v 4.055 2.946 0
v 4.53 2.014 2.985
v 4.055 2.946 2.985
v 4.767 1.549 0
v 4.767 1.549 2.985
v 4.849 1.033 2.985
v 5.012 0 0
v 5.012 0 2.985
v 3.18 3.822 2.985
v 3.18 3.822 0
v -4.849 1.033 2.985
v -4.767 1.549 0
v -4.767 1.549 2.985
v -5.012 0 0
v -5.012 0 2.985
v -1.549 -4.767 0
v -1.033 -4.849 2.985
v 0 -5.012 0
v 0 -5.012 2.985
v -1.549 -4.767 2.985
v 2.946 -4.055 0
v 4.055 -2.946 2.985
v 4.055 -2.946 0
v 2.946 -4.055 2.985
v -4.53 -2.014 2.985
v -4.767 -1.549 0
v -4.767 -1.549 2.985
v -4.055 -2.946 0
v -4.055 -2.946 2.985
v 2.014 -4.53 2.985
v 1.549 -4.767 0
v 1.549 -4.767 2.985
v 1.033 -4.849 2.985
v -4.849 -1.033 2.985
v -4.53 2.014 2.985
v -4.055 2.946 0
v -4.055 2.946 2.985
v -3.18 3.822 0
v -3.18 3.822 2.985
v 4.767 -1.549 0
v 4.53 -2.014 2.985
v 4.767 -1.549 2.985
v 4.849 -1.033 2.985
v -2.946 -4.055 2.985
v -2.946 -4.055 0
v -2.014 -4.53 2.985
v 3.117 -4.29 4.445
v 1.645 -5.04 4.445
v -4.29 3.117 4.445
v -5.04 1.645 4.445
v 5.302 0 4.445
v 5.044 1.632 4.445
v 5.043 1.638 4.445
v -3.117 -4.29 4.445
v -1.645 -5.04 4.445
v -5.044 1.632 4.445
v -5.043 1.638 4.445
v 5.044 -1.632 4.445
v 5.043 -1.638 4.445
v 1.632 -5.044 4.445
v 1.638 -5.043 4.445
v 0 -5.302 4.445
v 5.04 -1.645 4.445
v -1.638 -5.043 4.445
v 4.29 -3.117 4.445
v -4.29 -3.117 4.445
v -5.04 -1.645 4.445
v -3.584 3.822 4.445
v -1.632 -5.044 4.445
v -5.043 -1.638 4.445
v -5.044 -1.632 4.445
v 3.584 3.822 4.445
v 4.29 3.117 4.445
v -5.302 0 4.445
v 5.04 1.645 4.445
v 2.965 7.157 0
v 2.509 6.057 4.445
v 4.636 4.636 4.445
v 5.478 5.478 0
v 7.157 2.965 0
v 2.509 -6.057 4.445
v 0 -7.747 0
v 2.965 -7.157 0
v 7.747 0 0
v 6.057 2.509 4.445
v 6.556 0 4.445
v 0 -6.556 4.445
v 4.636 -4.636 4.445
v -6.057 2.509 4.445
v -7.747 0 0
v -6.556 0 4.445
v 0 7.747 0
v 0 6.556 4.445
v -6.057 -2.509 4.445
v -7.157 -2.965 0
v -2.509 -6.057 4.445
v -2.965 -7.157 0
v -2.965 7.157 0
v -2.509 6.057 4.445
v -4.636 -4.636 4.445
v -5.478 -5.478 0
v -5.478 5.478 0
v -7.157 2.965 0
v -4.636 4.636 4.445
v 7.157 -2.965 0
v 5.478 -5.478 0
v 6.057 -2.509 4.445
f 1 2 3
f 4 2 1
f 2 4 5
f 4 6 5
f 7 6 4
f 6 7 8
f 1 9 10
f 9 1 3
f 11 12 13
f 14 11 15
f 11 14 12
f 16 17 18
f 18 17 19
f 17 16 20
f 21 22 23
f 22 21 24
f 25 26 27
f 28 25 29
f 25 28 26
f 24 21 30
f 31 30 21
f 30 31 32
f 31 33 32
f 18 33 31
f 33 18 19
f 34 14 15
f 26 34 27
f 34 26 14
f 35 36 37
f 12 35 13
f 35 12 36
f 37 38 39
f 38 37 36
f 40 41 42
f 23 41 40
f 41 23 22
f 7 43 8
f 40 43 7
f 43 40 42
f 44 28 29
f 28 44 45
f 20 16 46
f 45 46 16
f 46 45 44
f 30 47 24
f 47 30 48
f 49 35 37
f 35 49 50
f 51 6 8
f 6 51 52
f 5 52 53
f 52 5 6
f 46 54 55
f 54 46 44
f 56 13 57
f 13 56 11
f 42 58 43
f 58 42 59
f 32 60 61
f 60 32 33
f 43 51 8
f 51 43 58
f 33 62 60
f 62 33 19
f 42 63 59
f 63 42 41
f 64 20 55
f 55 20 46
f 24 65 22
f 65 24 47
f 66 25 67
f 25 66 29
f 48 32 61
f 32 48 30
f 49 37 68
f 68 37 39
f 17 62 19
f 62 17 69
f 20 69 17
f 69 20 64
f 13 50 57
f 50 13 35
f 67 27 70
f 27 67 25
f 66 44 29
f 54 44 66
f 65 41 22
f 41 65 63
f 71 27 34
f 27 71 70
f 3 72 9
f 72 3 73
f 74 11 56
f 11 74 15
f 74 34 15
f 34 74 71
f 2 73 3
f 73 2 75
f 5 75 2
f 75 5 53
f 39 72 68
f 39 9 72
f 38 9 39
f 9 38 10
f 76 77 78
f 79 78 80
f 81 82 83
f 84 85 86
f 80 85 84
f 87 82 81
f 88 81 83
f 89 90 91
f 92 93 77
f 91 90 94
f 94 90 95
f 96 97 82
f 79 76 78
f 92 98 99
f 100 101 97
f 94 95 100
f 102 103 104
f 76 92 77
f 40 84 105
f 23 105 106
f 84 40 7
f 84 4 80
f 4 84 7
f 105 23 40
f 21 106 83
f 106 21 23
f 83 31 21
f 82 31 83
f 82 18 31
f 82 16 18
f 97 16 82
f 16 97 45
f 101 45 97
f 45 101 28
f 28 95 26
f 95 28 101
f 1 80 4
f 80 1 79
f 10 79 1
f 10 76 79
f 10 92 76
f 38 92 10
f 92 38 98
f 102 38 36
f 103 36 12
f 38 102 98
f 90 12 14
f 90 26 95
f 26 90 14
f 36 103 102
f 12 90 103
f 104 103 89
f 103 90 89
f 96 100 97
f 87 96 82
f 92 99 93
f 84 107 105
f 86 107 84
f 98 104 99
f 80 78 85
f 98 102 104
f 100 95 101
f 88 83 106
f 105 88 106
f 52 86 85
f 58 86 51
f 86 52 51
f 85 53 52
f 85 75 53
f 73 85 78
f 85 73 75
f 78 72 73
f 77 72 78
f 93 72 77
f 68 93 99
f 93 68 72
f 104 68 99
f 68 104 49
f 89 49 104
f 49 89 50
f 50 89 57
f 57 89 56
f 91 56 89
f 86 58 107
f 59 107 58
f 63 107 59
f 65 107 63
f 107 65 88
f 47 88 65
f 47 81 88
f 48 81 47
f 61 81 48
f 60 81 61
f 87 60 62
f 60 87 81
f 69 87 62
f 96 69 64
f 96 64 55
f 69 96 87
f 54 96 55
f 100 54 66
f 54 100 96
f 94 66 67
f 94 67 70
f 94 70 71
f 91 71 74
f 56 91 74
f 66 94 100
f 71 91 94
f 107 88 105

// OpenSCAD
// file: my_core.scad
inch = 25.4; // conversion factor

$fn=16;

threadwidth = 0.4;
tgap = 2*threadwidth;

core_h = 8;
flange_h = 4;

module core_footprint(tolerance=0.25) {
  difference() {
    union() {
      cylinder(r=3/8*inch/2+tolerance, h=core_h, $fn=20);
      translate([0,0,core_h-flange_h]) cylinder(h=flange_h, r1=3/8*inch/2+tolerance-0.5, r2=7/16*inch/2-0.5+tolerance, $fn=20);
    }

    translate([-1*inch,9/64*inch+0.25,-1]) cube([2*inch,2*inch,core_h+2]);
  }
}


module my_core() {

difference() {
  core_footprint(0);

  // hole
  translate([0,0,-1]) cylinder(r=9/64*inch/2+0.75, h=core_h+2);

  // central D
  translate([0,0,core_h-5/64*inch])
    difference() {
    cylinder(r=1/4*inch/2+0.5, h=5/64*inch + 1);
    translate([-1*inch, 3/32*inch+0.125, 0]) cube([2*inch, 2*inch, 3/64*inch]);
  }
}


}

my_core();
// main file
inch = 25.4; // conversion factor

$fn=16;

threadwidth = 0.4;
tgap = 2*threadwidth;

core_h = 8;
flange_h = 4;

use <my_core.scad>;

module my_outer_flange() {
difference() {
  cylinder(h=0.175*inch, r1=17/32*inch/2+1, r2=7/16*inch/2+1);
  translate([0,0,0.175*inch-core_h+0.02])
  core_footprint();
}
}



my_outer_flange();
